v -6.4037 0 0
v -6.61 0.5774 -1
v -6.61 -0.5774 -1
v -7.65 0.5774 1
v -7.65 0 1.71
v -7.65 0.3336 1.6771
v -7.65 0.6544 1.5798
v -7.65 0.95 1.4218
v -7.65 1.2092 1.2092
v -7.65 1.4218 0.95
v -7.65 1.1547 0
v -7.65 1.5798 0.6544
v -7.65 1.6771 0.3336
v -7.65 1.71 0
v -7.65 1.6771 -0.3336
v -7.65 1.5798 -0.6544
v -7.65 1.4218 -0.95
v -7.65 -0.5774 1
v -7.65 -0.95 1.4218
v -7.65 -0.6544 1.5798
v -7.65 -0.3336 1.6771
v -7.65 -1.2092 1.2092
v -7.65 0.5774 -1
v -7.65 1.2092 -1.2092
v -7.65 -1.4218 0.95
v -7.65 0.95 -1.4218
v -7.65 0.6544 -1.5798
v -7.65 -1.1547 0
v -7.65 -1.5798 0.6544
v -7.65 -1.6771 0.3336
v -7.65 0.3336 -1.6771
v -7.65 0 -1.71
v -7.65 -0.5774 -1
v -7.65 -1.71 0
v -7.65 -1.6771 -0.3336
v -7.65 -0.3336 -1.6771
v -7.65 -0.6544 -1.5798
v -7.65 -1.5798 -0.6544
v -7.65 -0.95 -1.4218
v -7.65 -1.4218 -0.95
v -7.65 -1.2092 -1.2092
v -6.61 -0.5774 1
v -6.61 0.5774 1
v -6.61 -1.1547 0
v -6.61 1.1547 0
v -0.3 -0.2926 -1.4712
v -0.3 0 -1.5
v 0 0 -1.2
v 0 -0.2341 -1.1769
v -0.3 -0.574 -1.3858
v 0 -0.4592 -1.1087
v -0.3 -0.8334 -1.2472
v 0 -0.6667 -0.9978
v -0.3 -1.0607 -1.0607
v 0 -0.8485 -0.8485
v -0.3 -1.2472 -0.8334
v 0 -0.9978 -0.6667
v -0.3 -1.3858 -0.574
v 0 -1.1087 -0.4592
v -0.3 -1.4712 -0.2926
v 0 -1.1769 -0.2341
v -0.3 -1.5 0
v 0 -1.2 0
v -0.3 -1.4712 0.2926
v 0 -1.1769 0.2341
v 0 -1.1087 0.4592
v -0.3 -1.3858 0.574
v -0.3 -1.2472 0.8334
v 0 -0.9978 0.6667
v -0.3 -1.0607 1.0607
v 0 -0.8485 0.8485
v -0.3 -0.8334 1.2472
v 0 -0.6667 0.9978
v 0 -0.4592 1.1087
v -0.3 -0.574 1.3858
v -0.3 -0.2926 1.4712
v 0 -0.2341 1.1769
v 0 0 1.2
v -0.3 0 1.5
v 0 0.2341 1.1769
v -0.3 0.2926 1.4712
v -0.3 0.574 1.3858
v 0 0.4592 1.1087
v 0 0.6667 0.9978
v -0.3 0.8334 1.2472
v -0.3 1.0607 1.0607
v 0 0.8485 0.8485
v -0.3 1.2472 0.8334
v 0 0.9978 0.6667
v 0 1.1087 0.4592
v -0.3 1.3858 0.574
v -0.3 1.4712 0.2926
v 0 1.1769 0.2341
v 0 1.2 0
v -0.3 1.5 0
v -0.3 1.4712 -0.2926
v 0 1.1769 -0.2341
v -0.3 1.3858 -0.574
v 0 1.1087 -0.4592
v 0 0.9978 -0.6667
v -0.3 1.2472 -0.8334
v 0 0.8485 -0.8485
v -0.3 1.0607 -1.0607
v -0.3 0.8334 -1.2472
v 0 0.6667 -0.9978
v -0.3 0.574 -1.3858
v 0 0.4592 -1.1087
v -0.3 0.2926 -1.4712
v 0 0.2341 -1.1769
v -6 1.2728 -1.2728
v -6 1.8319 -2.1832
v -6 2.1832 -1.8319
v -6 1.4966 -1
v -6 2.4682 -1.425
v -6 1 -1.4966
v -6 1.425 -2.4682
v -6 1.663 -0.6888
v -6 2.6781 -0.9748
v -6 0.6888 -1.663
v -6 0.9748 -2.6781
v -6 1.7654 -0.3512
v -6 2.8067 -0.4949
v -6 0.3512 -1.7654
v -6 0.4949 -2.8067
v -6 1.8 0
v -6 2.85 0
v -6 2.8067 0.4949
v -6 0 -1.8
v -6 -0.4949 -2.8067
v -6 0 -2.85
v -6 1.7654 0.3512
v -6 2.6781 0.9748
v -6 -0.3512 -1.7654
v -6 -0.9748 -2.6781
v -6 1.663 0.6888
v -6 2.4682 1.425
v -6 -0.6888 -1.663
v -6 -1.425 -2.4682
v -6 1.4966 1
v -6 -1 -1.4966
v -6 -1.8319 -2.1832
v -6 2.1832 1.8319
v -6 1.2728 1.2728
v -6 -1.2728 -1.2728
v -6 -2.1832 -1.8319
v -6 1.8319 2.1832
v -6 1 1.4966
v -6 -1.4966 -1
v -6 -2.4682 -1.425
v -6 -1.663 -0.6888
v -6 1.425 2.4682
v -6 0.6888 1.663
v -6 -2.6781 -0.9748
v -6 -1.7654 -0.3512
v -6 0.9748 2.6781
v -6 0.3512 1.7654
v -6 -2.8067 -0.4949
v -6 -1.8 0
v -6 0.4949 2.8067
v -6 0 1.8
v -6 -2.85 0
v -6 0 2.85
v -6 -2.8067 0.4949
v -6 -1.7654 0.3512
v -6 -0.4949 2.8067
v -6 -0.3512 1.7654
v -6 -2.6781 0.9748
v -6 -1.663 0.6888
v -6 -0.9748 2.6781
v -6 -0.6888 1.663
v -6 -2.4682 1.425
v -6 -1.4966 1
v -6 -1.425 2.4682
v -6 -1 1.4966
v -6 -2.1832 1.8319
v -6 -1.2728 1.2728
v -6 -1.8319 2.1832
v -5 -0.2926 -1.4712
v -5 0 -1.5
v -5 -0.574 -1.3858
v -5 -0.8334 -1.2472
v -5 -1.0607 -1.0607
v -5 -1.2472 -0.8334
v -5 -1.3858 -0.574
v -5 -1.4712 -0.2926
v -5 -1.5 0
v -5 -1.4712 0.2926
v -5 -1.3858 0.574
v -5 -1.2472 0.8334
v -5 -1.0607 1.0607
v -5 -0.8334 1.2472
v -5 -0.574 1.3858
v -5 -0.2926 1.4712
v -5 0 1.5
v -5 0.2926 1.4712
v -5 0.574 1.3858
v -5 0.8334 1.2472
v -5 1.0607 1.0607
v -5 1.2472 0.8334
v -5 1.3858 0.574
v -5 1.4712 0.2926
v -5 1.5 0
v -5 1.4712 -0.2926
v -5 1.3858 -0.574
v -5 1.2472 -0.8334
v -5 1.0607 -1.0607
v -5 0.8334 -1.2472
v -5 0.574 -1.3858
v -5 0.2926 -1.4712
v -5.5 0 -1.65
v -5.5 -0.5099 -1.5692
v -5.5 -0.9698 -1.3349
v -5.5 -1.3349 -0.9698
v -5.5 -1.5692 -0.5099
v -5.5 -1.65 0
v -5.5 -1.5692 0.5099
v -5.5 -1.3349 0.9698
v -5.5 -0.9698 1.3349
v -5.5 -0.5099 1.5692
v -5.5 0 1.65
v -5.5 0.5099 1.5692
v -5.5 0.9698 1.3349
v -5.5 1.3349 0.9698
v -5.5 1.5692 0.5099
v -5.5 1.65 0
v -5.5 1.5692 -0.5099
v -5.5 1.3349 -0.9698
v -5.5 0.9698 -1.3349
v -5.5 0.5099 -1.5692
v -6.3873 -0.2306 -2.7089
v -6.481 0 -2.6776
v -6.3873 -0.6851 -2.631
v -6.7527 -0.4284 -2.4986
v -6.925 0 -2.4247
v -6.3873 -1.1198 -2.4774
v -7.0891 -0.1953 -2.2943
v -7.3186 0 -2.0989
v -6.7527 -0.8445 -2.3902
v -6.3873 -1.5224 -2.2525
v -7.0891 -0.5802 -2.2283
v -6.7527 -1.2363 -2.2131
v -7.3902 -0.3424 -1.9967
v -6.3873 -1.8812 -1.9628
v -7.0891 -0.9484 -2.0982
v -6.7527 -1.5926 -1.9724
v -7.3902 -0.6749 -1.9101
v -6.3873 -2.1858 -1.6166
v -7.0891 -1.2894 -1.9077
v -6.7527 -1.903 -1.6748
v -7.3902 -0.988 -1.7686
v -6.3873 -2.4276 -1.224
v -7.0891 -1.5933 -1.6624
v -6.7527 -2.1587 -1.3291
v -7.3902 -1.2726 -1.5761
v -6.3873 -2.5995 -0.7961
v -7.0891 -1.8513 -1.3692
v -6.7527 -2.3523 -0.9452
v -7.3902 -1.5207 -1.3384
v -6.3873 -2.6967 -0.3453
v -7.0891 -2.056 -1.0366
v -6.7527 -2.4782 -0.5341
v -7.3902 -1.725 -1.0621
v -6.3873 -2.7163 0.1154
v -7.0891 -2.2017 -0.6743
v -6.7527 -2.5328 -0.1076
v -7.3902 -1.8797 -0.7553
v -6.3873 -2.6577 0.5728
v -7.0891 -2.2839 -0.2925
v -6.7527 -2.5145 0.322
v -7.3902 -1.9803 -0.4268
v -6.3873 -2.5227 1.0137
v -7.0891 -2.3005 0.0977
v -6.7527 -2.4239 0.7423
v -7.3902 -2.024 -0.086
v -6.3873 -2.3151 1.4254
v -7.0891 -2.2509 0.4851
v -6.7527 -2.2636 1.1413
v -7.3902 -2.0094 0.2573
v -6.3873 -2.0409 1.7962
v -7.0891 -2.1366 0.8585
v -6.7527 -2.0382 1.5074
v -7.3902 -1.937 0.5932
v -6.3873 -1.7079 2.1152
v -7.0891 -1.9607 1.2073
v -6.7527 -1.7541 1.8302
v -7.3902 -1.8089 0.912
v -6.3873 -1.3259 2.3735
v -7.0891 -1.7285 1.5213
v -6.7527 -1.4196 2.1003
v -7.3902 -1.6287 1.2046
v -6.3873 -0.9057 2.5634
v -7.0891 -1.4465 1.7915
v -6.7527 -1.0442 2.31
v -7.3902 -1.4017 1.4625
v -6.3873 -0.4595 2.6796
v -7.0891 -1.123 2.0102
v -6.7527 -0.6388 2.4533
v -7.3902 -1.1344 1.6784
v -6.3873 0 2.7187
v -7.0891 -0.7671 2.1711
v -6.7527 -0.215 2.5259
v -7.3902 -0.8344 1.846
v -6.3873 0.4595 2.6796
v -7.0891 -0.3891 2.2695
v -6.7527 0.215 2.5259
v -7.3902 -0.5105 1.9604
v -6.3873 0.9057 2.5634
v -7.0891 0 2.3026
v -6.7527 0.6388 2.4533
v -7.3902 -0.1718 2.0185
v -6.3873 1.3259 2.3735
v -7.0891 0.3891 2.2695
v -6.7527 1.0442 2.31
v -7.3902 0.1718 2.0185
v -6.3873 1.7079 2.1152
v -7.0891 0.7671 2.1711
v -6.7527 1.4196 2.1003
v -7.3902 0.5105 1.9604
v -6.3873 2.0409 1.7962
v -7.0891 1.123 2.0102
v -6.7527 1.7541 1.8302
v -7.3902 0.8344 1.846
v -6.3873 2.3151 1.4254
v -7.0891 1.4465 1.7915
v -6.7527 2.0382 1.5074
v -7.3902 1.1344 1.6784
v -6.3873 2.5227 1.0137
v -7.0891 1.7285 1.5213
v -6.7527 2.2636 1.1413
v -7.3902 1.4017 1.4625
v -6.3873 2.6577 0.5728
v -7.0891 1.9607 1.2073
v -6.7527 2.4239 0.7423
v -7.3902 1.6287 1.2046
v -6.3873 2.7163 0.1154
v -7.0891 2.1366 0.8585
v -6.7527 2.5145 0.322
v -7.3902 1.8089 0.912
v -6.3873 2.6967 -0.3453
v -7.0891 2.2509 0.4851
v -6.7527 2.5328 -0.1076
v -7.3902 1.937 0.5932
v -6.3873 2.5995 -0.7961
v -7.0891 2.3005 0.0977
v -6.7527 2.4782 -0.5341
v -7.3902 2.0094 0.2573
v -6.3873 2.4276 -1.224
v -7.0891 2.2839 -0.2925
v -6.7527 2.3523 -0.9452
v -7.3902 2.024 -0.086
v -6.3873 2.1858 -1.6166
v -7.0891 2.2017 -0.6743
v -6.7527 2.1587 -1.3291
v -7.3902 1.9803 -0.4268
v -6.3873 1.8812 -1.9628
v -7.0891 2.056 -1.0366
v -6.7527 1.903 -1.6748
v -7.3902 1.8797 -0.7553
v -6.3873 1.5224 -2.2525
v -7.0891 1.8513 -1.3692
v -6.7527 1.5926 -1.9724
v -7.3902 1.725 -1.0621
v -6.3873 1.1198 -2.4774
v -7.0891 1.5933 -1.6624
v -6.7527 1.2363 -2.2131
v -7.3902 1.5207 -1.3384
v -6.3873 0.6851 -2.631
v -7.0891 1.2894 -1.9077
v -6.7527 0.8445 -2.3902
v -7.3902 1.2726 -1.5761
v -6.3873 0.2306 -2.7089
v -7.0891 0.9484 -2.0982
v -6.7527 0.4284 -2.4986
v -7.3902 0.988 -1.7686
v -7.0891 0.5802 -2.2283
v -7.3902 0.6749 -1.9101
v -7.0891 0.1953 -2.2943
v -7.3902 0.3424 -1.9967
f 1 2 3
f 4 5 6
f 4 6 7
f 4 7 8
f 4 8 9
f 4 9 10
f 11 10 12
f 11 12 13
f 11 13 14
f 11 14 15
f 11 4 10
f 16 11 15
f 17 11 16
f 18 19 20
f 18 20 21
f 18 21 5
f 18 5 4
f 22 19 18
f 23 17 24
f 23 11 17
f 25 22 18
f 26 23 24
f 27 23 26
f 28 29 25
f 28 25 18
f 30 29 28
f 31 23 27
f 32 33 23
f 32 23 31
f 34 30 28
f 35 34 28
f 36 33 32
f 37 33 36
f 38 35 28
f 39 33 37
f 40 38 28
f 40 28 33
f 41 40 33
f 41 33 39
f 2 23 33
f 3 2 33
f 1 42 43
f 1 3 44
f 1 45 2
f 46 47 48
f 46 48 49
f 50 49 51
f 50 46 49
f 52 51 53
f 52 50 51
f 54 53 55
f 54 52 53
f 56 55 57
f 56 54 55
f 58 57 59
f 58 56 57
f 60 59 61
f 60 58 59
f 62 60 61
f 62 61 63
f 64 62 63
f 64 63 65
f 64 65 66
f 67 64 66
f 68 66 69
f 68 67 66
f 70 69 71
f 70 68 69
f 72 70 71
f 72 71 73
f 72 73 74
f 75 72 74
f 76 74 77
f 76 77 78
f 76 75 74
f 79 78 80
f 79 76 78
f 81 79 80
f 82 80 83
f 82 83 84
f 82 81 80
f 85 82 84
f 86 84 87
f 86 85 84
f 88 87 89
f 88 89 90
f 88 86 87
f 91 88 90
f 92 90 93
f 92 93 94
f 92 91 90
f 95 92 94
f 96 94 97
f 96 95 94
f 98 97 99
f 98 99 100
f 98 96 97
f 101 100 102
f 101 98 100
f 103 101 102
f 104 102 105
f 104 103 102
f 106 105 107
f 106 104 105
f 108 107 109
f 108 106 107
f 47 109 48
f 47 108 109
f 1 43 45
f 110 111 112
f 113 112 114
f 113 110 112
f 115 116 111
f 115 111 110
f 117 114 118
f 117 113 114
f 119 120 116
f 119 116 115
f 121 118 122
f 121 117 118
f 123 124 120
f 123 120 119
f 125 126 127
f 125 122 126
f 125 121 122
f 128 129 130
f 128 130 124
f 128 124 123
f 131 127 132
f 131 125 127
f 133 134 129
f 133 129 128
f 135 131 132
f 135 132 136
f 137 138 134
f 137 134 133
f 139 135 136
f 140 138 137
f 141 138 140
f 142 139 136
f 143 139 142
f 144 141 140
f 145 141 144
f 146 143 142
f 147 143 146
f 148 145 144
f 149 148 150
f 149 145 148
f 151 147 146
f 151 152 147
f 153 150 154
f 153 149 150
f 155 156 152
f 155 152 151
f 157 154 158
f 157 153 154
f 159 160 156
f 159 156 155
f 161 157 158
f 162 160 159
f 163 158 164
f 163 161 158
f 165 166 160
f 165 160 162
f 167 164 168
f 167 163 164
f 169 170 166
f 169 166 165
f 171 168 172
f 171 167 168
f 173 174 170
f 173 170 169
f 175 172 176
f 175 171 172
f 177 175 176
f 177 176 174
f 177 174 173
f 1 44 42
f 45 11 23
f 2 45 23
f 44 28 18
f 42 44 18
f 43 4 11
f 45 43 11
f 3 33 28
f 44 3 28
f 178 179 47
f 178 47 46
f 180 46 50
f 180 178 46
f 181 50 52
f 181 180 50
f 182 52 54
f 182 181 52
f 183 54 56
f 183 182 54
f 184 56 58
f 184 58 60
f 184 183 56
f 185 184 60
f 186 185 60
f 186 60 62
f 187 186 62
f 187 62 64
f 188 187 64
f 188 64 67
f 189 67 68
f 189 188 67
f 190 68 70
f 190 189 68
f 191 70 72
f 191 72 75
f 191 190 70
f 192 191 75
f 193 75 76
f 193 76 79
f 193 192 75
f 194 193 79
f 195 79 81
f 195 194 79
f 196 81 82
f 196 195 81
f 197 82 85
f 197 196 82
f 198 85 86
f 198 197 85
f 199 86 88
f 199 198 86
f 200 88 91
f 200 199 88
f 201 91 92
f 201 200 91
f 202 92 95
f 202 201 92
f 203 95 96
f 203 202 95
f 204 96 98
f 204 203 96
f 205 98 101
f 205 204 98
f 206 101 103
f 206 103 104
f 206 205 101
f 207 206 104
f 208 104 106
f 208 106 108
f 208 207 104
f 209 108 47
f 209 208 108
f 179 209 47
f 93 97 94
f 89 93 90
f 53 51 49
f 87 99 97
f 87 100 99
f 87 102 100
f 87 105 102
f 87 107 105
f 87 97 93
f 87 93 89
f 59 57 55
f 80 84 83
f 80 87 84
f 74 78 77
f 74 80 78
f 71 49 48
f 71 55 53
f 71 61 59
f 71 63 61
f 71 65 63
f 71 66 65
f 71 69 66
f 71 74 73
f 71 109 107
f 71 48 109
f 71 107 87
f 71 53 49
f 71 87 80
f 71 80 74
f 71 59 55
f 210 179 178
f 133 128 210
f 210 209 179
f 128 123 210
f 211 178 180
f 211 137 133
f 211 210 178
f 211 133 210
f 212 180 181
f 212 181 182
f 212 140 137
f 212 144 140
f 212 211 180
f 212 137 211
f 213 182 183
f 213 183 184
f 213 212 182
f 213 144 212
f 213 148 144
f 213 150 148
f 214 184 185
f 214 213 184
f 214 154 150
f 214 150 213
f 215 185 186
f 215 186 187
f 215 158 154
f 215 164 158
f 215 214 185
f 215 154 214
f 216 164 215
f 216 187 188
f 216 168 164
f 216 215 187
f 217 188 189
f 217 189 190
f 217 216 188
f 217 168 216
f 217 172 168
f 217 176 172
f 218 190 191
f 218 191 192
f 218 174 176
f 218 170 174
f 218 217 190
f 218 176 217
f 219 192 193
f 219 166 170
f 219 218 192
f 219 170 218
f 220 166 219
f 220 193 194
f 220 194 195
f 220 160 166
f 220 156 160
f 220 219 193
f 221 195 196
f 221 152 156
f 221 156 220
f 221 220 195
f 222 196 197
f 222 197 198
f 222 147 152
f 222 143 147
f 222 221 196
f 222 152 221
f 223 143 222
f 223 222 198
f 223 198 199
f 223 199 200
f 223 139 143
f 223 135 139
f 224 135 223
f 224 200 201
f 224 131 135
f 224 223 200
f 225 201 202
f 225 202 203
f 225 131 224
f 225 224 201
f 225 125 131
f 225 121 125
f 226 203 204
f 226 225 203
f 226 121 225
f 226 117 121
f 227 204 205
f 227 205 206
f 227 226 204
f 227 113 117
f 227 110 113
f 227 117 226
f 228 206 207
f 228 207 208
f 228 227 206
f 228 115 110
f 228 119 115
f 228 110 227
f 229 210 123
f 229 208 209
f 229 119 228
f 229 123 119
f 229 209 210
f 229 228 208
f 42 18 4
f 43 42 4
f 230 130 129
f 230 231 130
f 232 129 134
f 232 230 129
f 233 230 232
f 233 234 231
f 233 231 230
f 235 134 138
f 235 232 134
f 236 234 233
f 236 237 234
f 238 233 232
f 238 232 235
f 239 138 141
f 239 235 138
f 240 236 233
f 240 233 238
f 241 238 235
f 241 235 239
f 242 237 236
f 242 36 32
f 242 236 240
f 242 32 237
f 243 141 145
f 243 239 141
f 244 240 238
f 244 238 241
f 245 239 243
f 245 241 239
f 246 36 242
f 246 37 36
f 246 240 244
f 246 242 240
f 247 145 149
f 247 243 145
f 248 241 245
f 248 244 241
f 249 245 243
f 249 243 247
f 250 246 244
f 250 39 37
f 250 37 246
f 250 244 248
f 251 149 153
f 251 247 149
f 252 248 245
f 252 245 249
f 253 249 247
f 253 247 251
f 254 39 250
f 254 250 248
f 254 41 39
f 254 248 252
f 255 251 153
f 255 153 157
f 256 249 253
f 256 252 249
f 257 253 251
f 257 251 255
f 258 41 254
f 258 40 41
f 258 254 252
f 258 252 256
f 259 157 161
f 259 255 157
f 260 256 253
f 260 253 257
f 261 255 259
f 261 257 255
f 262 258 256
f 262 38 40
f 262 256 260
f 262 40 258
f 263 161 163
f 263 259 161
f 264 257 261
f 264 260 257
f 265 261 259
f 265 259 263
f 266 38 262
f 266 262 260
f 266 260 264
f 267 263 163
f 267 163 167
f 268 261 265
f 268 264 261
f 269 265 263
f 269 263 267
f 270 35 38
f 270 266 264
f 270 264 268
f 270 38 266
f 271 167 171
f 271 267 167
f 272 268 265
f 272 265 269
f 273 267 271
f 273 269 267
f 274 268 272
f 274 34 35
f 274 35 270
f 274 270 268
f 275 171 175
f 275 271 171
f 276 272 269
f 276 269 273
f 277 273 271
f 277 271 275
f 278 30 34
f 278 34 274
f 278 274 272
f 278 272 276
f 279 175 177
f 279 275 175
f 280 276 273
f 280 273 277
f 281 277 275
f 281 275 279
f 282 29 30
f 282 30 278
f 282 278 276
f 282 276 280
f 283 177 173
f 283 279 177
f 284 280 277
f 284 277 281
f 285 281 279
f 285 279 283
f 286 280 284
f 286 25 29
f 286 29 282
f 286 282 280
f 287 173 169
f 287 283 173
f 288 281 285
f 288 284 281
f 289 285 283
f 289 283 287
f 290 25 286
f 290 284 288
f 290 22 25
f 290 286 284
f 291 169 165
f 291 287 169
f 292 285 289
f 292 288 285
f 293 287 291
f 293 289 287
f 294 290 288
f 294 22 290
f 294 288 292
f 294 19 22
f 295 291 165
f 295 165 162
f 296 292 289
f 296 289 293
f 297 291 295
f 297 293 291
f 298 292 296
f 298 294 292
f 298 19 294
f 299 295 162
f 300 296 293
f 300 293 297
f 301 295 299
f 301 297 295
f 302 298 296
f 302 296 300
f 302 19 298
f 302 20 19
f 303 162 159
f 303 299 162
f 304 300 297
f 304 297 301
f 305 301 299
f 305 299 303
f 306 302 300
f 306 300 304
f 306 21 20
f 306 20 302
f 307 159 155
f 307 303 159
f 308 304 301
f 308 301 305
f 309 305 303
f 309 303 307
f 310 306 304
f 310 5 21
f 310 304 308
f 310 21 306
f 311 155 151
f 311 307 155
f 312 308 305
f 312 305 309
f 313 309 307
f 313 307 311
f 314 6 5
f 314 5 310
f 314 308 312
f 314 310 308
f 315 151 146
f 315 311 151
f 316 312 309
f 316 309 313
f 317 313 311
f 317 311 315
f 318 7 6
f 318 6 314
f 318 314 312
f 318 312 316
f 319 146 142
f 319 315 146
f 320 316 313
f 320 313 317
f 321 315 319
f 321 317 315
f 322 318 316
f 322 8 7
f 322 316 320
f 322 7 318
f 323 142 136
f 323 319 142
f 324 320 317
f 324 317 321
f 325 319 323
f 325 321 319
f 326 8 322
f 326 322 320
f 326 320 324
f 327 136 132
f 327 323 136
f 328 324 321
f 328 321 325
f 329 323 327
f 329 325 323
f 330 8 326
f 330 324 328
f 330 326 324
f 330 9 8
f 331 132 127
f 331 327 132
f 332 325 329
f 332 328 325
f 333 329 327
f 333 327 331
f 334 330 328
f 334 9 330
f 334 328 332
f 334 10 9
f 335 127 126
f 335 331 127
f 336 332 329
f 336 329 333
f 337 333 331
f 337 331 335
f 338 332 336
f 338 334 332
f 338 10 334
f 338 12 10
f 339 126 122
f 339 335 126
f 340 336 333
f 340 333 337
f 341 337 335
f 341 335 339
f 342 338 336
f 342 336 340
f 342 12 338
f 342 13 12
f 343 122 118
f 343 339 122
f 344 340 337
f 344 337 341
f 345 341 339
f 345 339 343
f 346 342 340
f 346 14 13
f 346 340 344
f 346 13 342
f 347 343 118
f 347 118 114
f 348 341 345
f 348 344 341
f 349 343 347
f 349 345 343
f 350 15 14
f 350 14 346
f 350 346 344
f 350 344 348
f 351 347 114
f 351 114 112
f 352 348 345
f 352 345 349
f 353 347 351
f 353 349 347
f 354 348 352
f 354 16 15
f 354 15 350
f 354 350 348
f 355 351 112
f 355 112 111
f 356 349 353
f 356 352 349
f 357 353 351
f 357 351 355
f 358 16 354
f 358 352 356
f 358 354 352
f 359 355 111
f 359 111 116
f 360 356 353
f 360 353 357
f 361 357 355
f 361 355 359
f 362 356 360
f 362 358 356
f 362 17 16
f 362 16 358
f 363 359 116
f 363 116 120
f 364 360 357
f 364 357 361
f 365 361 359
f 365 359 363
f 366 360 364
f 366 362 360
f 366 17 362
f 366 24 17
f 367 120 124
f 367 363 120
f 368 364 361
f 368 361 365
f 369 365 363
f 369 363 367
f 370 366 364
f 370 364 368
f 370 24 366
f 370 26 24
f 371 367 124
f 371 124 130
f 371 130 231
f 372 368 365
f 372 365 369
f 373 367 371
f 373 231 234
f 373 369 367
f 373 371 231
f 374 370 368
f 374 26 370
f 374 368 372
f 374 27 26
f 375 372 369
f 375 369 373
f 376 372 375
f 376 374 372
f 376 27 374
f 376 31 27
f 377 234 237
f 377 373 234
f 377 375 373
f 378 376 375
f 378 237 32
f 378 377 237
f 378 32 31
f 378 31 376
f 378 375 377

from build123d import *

# Parameters (mm, degrees)
CUT_EXTRUDE_1_DEPTH = 1.04
CHAMFER_1_SIZE      = 0.3


with BuildPart() as part:
    # 草图1 → 旋转1 (revolve)
    with BuildSketch(Plane.XY, mode=Mode.PRIVATE) as revolve_1_sk:
        with BuildLine():
            Line((0, 0), (0, 1.5))
            Line((0, 1.5), (-5, 1.5))
            Line((-5, 1.5), (-6, 1.8))
            Line((-6, 1.8), (-6, 2.85))
            ThreePointArc((-6, 2.85), (-6.924953874, 2.424670081), (-7.65, 1.71))
            Line((-7.65, 1.71), (-7.65, 0))
            Line((-7.65, 0), (0, 0))
        make_face()
    revolve(revolve_1_sk.sketch.rotate(Axis((0, 0, 0), (-1, 0, 0)), 90), axis=Axis((0, 0, 0), (-1, 0, 0)))

    # 草图4 → 切除-拉伸1 (cut)
    with BuildSketch(Plane.ZY.offset(7.65)):
        Polygon((0, 1.154700538), (-1, 0.577350269), (-1, -0.577350269), (0, -1.154700538), (1, -0.577350269), (1, 0.577350269), align=None)
    extrude(amount=-CUT_EXTRUDE_1_DEPTH, mode=Mode.SUBTRACT)

    # 倒角1
    chamfer_1_edges = [part.edges().sort_by_distance(p)[0] for p in [
        (0, 0, 1.5),
    ]]
    chamfer(chamfer_1_edges, length=CHAMFER_1_SIZE)

    # 草图6 → 切除-放样1 section 0
    with BuildSketch(Plane.ZY.offset(6.61), mode=Mode.PRIVATE) as loft_1_s0:
        with BuildLine():
            Line((0, 1.154700538), (-1, 0.577350269))
            Line((-1, 0.577350269), (-1, -0.577350269))
            Line((-1, -0.577350269), (0, -1.154700538))
            Line((0, -1.154700538), (1, -0.577350269))
            Line((1, -0.577350269), (1, 0.577350269))
            Line((1, 0.577350269), (0, 1.154700538))
        make_face()
    loft([Vertex(-6.40375, 0, 0), loft_1_s0.sketch], mode=Mode.SUBTRACT)


solid = part.part
